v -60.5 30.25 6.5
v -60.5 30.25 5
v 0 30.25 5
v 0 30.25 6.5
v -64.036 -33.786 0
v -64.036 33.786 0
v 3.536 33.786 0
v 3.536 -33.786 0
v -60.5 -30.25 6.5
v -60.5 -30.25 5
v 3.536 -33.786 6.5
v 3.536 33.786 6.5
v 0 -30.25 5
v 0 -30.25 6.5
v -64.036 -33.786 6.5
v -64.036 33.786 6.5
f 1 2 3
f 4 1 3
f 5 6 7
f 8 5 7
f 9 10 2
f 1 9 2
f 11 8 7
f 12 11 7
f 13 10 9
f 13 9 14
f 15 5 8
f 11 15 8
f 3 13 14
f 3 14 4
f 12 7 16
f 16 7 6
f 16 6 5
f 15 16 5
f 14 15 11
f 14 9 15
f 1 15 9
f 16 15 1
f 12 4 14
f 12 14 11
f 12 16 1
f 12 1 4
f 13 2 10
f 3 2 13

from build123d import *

# Parameters (mm, degrees)
F0_W     = 60.5
F0_H     = 60.5
F1_DEPTH = 5
F2_DEPTH = 6.5


with BuildPart() as f1:
    # F0 (on Top) → F1 (new body)
    with BuildSketch(Plane.XY):
        Polygon((3.5355339059, -12.5), (3.5355339059, 12.5), (3.5355339059, 33.7855339059), (-64.0355339059, 33.7855339059), (-64.0355339059, -33.7855339059), (3.5355339059, -33.7855339059), align=None)
        with Locations((-30.25, 0)):
            Rectangle(F0_W, F0_H, mode=Mode.SUBTRACT)
        with Locations((-30.25, 0)):
            Rectangle(F0_W, F0_H)
    extrude(amount=F1_DEPTH)

    # F0 (on Top) → F2 (join)
    with BuildSketch(Plane.XY):
        Polygon((3.5355339059, -12.5), (3.5355339059, 12.5), (3.5355339059, 33.7855339059), (-64.0355339059, 33.7855339059), (-64.0355339059, -33.7855339059), (3.5355339059, -33.7855339059), align=None)
        with Locations((-30.25, 0)):
            Rectangle(F0_W, F0_H, mode=Mode.SUBTRACT)
    extrude(amount=F2_DEPTH)


solid = f1.part
